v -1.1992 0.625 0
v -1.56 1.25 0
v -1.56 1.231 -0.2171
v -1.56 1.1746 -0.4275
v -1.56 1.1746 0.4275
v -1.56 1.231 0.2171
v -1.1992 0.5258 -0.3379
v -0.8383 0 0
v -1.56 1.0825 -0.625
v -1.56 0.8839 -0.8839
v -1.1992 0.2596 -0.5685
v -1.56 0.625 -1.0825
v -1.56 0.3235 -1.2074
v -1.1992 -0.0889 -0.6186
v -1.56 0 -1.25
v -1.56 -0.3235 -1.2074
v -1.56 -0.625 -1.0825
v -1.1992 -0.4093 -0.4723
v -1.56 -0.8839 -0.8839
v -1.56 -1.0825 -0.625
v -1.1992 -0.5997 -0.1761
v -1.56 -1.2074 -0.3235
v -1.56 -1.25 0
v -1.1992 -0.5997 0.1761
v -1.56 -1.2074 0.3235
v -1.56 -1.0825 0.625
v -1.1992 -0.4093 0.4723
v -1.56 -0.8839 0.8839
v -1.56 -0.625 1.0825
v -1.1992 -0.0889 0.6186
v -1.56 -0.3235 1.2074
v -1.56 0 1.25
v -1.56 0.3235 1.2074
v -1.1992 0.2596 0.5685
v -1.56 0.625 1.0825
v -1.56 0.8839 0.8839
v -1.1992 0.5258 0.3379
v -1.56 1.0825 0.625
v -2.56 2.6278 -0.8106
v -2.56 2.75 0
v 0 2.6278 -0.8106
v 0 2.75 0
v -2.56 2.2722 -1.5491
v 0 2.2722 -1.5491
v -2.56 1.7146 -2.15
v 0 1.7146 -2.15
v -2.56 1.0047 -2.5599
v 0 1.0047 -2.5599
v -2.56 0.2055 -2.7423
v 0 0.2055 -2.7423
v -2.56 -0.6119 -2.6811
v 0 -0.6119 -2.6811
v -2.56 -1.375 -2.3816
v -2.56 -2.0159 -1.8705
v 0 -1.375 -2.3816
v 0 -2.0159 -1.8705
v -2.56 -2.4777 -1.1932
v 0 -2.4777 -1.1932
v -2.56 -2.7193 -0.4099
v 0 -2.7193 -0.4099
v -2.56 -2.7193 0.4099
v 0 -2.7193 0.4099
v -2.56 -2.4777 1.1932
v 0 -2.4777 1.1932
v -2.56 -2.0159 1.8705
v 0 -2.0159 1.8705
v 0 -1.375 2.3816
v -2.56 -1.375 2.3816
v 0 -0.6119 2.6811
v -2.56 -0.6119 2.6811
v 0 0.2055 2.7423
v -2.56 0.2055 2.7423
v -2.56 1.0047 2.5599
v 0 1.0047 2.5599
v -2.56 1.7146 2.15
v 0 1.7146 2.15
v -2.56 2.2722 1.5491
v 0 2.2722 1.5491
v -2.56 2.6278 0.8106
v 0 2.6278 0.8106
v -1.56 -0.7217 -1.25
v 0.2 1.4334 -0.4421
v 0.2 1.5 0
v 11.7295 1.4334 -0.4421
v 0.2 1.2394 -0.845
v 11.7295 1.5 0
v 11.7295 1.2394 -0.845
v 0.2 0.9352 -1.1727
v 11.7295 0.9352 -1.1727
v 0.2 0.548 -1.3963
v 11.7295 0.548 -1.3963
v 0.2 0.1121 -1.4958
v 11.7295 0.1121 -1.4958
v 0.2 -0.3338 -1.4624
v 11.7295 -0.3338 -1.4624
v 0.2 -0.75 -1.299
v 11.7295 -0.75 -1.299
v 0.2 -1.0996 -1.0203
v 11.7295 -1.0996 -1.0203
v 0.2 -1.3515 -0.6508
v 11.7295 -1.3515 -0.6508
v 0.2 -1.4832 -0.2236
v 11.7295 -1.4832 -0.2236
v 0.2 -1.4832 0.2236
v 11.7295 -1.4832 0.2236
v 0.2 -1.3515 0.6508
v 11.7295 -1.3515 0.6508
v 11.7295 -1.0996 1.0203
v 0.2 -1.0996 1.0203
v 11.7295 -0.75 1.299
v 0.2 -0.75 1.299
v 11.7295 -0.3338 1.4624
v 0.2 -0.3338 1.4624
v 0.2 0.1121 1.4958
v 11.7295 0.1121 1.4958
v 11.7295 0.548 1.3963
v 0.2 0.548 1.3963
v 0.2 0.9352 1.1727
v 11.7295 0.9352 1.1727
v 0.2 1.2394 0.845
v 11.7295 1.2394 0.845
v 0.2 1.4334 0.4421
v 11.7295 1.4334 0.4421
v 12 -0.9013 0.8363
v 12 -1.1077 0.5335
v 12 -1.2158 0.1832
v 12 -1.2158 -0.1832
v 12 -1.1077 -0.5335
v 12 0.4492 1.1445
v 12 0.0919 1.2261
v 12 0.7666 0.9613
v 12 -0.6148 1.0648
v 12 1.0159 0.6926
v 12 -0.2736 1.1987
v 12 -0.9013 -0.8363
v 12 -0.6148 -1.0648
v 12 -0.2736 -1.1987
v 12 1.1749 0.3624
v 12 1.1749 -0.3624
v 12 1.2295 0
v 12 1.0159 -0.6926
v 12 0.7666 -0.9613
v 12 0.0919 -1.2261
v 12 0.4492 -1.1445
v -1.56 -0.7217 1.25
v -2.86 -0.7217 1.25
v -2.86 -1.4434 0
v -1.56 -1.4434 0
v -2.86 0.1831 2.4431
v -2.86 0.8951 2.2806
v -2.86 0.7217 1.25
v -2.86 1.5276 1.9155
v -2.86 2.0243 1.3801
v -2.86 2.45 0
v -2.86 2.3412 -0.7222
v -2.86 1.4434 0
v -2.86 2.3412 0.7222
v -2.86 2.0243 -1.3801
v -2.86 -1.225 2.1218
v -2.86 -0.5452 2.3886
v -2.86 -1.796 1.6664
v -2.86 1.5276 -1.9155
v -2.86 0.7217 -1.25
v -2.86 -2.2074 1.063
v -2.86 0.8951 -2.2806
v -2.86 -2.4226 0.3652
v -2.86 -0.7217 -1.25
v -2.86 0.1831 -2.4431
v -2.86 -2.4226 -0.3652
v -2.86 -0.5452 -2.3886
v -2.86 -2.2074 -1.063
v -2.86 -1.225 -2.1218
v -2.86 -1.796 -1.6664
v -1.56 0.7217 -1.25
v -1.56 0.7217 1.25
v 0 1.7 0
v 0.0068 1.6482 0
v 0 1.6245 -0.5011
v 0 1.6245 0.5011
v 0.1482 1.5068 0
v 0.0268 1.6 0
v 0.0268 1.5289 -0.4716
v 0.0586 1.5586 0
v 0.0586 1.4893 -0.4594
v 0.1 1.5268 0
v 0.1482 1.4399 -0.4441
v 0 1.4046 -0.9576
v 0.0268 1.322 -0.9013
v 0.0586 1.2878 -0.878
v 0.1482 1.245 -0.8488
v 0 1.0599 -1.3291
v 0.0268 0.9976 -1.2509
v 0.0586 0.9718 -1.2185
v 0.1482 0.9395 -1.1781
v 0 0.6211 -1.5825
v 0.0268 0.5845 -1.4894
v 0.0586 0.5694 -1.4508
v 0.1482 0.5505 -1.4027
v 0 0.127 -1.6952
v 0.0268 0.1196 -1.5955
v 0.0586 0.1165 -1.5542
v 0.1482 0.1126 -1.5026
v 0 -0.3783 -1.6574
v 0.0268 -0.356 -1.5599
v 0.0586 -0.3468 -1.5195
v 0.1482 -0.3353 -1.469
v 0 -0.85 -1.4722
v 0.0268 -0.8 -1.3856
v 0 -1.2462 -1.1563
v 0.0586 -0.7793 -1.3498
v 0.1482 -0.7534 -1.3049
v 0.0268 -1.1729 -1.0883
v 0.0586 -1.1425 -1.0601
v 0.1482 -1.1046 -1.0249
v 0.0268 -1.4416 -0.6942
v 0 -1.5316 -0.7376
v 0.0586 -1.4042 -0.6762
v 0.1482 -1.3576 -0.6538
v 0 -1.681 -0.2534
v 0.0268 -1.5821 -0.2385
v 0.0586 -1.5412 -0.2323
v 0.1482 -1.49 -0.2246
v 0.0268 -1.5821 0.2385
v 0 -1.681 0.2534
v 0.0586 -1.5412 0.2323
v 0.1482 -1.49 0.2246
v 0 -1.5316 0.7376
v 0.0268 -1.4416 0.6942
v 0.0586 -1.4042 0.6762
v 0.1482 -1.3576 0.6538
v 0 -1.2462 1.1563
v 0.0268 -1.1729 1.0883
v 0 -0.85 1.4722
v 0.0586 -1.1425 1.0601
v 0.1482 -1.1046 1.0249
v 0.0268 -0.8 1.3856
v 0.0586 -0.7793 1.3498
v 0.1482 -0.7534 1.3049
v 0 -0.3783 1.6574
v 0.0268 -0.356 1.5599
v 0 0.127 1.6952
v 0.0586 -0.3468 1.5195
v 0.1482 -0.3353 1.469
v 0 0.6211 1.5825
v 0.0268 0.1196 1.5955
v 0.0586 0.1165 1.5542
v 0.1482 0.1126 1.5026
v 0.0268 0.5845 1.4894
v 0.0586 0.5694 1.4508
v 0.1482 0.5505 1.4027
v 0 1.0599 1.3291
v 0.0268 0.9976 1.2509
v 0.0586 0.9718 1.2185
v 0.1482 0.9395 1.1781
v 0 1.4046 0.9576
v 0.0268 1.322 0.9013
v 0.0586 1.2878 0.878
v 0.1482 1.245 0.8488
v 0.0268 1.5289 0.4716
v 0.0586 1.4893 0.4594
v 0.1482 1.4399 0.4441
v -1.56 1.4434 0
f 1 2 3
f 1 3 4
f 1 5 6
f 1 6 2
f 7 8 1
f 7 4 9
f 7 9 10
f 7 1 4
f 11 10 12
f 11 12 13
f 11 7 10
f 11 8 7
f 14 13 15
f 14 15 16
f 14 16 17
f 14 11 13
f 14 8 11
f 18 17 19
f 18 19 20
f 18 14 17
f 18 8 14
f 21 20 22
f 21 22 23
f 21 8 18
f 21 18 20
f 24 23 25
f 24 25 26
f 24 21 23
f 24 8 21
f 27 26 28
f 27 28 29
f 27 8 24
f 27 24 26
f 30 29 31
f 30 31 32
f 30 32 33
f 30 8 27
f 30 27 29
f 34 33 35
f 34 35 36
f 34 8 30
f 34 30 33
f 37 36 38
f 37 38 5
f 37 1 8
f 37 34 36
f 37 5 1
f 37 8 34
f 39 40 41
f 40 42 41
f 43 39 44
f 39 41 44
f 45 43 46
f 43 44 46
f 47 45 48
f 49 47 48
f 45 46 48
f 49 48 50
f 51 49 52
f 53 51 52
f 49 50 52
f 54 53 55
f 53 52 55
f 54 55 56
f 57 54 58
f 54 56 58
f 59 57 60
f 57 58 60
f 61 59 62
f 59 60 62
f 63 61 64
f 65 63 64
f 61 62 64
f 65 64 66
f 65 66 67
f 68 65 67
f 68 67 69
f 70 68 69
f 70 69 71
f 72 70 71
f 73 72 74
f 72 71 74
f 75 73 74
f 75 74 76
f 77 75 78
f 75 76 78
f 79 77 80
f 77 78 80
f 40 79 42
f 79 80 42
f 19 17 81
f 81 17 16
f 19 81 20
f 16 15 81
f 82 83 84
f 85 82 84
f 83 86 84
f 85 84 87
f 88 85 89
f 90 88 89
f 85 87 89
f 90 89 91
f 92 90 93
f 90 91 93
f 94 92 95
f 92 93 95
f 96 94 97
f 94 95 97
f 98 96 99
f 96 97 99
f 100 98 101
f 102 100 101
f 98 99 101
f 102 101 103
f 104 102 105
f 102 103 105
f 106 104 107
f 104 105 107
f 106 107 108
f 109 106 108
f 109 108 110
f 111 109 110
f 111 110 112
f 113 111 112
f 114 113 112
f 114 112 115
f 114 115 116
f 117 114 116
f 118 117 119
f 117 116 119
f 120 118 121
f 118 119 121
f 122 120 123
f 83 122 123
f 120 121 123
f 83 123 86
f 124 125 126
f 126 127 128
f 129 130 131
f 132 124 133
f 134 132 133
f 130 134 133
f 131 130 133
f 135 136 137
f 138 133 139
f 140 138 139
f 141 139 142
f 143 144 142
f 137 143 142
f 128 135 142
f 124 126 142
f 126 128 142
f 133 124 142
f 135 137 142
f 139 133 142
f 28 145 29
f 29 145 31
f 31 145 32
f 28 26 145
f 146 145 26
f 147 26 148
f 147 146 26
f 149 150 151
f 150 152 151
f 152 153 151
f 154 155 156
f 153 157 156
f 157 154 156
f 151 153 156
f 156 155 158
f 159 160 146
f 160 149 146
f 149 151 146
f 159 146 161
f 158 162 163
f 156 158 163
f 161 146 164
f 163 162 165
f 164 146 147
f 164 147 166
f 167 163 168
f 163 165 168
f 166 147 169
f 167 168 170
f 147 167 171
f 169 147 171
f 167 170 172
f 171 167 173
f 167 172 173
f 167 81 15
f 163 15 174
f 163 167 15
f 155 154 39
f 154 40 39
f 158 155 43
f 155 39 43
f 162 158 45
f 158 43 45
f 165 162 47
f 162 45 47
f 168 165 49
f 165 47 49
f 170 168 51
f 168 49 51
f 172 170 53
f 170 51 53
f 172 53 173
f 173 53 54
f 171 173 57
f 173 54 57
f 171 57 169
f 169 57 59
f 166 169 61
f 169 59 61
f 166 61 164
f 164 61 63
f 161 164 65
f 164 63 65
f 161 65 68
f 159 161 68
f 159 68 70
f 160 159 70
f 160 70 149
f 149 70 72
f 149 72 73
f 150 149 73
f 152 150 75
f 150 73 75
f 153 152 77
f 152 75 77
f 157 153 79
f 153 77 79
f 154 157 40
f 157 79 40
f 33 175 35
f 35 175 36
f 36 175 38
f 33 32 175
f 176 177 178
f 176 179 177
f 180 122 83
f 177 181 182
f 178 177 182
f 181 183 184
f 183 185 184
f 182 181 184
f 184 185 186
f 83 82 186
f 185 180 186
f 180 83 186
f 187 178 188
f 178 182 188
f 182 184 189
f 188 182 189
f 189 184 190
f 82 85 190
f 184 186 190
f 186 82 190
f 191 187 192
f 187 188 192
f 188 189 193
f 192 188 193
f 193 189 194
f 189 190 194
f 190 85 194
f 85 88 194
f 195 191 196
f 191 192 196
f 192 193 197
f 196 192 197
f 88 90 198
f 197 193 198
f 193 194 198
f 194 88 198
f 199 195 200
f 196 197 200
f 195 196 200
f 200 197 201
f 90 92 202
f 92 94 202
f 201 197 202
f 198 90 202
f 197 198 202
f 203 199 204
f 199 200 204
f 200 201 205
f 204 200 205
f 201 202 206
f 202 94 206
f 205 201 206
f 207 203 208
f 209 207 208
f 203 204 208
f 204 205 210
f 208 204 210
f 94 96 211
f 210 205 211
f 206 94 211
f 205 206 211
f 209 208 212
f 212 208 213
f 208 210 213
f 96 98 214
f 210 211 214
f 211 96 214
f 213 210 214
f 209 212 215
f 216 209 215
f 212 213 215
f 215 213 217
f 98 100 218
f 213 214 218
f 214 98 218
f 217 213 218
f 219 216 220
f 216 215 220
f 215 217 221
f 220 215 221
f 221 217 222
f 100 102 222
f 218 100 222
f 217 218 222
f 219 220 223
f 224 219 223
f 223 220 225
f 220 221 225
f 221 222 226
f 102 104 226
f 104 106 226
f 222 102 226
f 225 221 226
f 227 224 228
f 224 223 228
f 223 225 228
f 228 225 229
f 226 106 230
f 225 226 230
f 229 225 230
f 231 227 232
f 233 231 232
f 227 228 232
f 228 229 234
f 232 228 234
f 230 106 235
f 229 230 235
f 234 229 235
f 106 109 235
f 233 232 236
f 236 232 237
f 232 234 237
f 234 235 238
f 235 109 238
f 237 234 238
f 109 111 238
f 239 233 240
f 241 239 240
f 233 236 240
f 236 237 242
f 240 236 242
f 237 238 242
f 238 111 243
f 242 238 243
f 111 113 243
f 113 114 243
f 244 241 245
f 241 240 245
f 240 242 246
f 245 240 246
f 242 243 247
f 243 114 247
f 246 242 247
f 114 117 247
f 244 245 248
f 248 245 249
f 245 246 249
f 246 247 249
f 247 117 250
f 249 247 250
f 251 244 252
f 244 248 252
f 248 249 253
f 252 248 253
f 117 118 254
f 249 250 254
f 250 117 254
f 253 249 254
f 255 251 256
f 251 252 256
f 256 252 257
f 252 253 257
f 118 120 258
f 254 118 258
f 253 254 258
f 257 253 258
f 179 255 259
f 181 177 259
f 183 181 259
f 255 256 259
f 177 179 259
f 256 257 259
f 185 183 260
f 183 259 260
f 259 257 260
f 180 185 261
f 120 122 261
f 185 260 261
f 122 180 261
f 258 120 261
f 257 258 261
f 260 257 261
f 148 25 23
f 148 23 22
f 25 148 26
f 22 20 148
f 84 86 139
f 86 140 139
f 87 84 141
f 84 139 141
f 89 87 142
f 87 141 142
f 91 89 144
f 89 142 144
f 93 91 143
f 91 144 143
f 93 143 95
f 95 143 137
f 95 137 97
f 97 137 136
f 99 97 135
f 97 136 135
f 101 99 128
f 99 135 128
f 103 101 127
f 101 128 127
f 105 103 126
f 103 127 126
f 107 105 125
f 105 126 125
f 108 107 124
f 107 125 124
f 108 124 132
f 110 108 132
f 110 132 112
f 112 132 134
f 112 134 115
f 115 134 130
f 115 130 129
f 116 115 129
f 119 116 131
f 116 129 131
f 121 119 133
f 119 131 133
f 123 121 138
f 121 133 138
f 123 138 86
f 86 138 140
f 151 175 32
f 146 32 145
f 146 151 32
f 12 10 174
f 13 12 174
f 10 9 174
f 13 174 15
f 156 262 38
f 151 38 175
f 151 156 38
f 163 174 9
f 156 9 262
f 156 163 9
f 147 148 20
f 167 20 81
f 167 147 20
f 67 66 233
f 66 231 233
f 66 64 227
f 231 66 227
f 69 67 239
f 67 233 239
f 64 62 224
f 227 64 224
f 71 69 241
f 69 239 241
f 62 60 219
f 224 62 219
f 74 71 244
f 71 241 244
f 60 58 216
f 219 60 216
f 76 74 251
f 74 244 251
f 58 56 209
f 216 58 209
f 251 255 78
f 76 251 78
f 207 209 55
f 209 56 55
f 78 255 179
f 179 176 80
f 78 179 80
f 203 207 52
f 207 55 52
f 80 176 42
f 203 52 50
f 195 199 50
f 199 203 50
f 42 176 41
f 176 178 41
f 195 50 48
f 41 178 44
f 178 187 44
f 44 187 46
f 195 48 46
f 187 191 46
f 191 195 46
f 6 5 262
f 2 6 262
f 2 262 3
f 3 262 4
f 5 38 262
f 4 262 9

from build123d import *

# Parameters (mm, degrees)
CUT_EXTRUDE1_DEPTH = 1.3


with BuildPart() as part:
    # Sketch1 → Revolve1 (revolve)
    with BuildSketch(Plane.XY):
        with BuildLine():
            Line((-2.86, 0), (-2.86, 2.45))
            Line((-2.86, 2.45), (-2.56, 2.75))
            Line((-2.56, 2.75), (0, 2.75))
            Line((0, 2.75), (0, 1.7))
            ThreePointArc((0, 1.7), (0.058578644, 1.558578644), (0.2, 1.5))
            Line((0.2, 1.5), (11.7295, 1.5))
            Line((11.7295, 1.5), (12, 1.2295))
            Line((12, 1.2295), (12, 0))
            Line((12, 0), (-2.86, 0))
        make_face()
    revolve(axis=Axis((12, 0, 0), (-1, 0, 0)))

    # Sketch2 → Cut-Extrude1 (cut)
    with BuildSketch(Plane(origin=(-2.86, 0, 0), x_dir=(0, 0, -1), z_dir=(1, 0, 0))):
        Polygon((-1.25, 0.721687836), (-1.25, -0.721687836), (0, -1.443375673), (1.25, -0.721687836), (1.25, 0.721687836), (0, 1.443375673), align=None)
    extrude(amount=CUT_EXTRUDE1_DEPTH, mode=Mode.SUBTRACT)

    # Sketch3 → Cut-Revolve1 (revolve, cut)
    with BuildSketch(Plane.XY):
        Polygon((-1.56, 0), (-1.56, 1.25), (-0.838312164, 0), align=None)
    revolve(axis=Axis((-0.838312164, 0, 0), (-1, 0, 0)), mode=Mode.SUBTRACT)


solid = part.part
